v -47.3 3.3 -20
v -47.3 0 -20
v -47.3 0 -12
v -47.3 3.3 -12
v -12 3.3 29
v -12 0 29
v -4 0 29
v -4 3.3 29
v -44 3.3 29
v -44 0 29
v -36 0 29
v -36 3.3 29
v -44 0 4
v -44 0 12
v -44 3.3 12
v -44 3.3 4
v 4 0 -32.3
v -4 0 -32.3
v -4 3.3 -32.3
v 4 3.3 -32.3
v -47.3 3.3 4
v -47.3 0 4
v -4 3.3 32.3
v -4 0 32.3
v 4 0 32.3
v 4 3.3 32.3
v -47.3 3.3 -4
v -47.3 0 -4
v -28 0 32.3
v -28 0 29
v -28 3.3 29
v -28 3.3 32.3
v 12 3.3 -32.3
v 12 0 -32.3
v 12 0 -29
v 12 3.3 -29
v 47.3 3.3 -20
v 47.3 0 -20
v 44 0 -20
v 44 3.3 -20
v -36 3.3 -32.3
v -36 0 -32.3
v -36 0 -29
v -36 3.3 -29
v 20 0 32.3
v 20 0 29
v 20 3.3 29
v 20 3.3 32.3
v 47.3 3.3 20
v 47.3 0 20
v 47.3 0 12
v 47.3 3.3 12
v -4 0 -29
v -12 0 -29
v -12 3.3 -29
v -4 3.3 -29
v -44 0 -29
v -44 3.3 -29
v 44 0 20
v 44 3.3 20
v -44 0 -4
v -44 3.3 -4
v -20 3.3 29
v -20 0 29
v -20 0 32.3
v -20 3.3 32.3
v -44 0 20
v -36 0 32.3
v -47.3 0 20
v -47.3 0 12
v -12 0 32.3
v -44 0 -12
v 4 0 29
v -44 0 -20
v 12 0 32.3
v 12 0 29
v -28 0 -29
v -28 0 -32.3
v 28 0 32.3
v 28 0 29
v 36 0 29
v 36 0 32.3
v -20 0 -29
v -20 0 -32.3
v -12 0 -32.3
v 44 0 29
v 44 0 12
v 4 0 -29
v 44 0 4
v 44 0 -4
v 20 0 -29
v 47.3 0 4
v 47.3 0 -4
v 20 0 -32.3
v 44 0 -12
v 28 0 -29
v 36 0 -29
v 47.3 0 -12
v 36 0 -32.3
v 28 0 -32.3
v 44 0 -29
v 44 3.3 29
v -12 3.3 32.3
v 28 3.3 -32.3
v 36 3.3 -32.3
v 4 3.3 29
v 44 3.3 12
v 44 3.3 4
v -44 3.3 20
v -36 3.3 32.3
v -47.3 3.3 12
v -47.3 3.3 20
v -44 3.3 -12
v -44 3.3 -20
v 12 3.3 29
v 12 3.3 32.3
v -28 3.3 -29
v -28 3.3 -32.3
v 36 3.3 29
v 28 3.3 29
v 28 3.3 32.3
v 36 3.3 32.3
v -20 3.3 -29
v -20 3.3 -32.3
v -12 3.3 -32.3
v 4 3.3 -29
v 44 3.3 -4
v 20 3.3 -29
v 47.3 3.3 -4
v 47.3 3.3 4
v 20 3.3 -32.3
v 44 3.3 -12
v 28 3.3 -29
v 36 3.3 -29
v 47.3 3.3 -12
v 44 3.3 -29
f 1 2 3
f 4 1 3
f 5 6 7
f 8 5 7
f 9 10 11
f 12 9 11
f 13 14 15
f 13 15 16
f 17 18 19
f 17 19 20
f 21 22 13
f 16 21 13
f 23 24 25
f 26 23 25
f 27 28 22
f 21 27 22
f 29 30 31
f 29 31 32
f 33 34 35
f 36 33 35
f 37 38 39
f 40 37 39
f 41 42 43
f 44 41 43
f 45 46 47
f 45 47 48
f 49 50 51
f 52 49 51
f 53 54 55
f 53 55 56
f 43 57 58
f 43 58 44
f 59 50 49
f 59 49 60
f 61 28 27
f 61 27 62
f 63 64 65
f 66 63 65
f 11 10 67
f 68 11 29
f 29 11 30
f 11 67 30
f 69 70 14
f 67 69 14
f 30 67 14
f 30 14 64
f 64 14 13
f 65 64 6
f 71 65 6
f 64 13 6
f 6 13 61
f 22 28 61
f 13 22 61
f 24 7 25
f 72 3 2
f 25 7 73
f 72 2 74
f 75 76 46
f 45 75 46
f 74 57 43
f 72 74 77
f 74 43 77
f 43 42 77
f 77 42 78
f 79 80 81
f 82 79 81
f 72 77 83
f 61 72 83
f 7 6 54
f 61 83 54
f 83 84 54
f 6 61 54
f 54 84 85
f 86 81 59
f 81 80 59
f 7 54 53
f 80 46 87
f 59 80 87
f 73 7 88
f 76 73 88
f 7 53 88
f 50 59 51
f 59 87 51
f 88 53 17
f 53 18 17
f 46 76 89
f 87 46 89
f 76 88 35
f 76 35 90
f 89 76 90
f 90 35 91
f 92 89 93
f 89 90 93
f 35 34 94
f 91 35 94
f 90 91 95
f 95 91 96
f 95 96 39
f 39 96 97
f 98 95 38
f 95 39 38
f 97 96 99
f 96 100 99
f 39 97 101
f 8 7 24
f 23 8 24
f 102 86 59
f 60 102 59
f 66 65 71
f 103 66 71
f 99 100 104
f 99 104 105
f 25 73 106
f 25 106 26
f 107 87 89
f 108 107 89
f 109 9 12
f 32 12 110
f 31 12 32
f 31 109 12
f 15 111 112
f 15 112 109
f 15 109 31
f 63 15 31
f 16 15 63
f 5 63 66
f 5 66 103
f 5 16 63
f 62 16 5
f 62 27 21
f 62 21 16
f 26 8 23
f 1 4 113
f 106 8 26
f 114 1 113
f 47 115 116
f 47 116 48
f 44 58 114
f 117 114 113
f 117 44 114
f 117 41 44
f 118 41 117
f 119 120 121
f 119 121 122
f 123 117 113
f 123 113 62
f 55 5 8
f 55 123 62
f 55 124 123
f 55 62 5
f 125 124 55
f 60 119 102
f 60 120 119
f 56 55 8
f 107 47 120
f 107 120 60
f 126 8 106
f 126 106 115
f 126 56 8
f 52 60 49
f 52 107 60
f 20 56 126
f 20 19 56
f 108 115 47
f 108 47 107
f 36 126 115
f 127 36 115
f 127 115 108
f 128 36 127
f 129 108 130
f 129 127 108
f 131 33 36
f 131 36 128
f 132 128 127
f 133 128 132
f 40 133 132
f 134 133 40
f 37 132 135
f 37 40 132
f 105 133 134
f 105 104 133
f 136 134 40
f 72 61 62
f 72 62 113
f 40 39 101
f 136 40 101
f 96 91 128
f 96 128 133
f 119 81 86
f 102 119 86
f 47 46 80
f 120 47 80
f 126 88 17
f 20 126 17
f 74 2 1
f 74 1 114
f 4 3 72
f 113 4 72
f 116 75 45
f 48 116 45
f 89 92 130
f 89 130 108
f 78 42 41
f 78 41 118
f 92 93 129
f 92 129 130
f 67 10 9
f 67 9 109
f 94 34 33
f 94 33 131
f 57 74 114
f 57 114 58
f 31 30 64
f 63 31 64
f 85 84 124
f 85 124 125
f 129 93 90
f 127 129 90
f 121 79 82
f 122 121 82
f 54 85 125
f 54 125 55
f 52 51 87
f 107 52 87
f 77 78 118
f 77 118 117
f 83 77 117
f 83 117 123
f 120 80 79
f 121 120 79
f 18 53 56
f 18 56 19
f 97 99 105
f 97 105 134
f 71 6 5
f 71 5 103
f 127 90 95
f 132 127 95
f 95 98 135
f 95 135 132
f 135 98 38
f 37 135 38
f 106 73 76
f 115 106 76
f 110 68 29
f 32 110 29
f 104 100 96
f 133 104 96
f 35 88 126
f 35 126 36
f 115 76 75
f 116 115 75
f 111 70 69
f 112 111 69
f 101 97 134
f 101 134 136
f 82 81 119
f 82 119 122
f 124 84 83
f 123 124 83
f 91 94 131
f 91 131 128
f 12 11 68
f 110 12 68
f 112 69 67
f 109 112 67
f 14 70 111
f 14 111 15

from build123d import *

# Parameters (mm, degrees)
ESQUISSE4_W                    = 88
ESQUISSE4_H                    = 58
BOSS_EXTRU_3_DEPTH             = 3.3
ESQUISSE5_W                    = 8
ESQUISSE5_H                    = 3.3
BOSS_EXTRU_6_DEPTH             = 3.3
R_P_TITION_LIN_AIRE2_COUNT     = 3
R_P_TITION_LIN_AIRE2_PITCH     = 16
R_P_TITION_LIN_AIRE2_COL_COUNT = 3
R_P_TITION_LIN_AIRE2_COL_PITCH = 16
SYM_TRIE1_COPY_1_SKETCH_W      = 8
SYM_TRIE1_COPY_1_SKETCH_H      = 3.3
SYM_TRIE1_COPY_1_DEPTH         = 3.3
SYM_TRIE1_COPY_2_SKETCH_W      = 8
SYM_TRIE1_COPY_2_SKETCH_H      = 3.3
SYM_TRIE1_COPY_2_DEPTH         = 3.3
SYM_TRIE1_COPY_3_SKETCH_W      = 8
SYM_TRIE1_COPY_3_SKETCH_H      = 3.3
SYM_TRIE1_COPY_3_DEPTH         = 3.3
SYM_TRIE1_COPY_4_SKETCH_W      = 8
SYM_TRIE1_COPY_4_SKETCH_H      = 3.3
SYM_TRIE1_COPY_4_DEPTH         = 3.3
ESQUISSE6_W                    = 3.3
ESQUISSE6_H                    = 8
BOSS_EXTRU_7_DEPTH             = 3.3
R_P_TITION_LIN_AIRE3_COUNT     = 2
R_P_TITION_LIN_AIRE3_PITCH     = 16
R_P_TITION_LIN_AIRE3_COL_COUNT = 2
R_P_TITION_LIN_AIRE3_COL_PITCH = 16
SYM_TRIE2_COPY_1_SKETCH_W      = 3.3
SYM_TRIE2_COPY_1_SKETCH_H      = 8
SYM_TRIE2_COPY_1_DEPTH         = 3.3
SYM_TRIE2_COPY_2_SKETCH_W      = 3.3
SYM_TRIE2_COPY_2_SKETCH_H      = 8
SYM_TRIE2_COPY_2_DEPTH         = 3.3


with BuildPart() as part:
    # Esquisse4 → Boss.-Extru.3 (new body)
    with BuildSketch(Plane(origin=(0, 0, 0), x_dir=(1, 0, 0), z_dir=(0, 1, 0))):
        Rectangle(ESQUISSE4_W, ESQUISSE4_H)
    extrude(amount=BOSS_EXTRU_3_DEPTH)

    # Esquisse5 → Boss.-Extru.6 (add)
    with BuildSketch(Plane.XZ):
        with Locations((0, 30.65)):
            Rectangle(ESQUISSE5_W, ESQUISSE5_H)
    boss_extru_6 = extrude(amount=-BOSS_EXTRU_6_DEPTH)

    # Répétition linéaire2: Boss.-Extru.6 ×3
    with Locations(*[(-i * R_P_TITION_LIN_AIRE2_PITCH, 0, 0) for i in range(1, R_P_TITION_LIN_AIRE2_COUNT)]):
        add(boss_extru_6)

    # Répétition linéaire2 col: Boss.-Extru.6 ×3
    with Locations(*[(i * R_P_TITION_LIN_AIRE2_COL_PITCH, 0, 0) for i in range(1, R_P_TITION_LIN_AIRE2_COL_COUNT)]):
        add(boss_extru_6)

    # Symétrie1: Boss.-Extru.6 across plane
    add(boss_extru_6.mirror(Plane.XY))

    # Symétrie1 copy 1 sketch → Symétrie1 copy 1 (add)
    with BuildSketch(Plane(origin=(-16, 0, 0), x_dir=(1, 0, 0), z_dir=(0, -1, 0))):
        with Locations((0, -30.65)):
            Rectangle(SYM_TRIE1_COPY_1_SKETCH_W, SYM_TRIE1_COPY_1_SKETCH_H)
    extrude(amount=-SYM_TRIE1_COPY_1_DEPTH)

    # Symétrie1 copy 2 sketch → Symétrie1 copy 2 (add)
    with BuildSketch(Plane(origin=(-32, 0, 0), x_dir=(1, 0, 0), z_dir=(0, -1, 0))):
        with Locations((0, -30.65)):
            Rectangle(SYM_TRIE1_COPY_2_SKETCH_W, SYM_TRIE1_COPY_2_SKETCH_H)
    extrude(amount=-SYM_TRIE1_COPY_2_DEPTH)

    # Symétrie1 copy 3 sketch → Symétrie1 copy 3 (add)
    with BuildSketch(Plane(origin=(16, 0, 0), x_dir=(1, 0, 0), z_dir=(0, -1, 0))):
        with Locations((0, -30.65)):
            Rectangle(SYM_TRIE1_COPY_3_SKETCH_W, SYM_TRIE1_COPY_3_SKETCH_H)
    extrude(amount=-SYM_TRIE1_COPY_3_DEPTH)

    # Symétrie1 copy 4 sketch → Symétrie1 copy 4 (add)
    with BuildSketch(Plane(origin=(32, 0, 0), x_dir=(1, 0, 0), z_dir=(0, -1, 0))):
        with Locations((0, -30.65)):
            Rectangle(SYM_TRIE1_COPY_4_SKETCH_W, SYM_TRIE1_COPY_4_SKETCH_H)
    extrude(amount=-SYM_TRIE1_COPY_4_DEPTH)

    # Esquisse6 → Boss.-Extru.7 (add)
    with BuildSketch(Plane.XZ):
        with Locations((-45.65, 0)):
            Rectangle(ESQUISSE6_W, ESQUISSE6_H)
    boss_extru_7 = extrude(amount=-BOSS_EXTRU_7_DEPTH)

    # Répétition linéaire3: Boss.-Extru.7 ×2
    with Locations(*[(0, 0, i * R_P_TITION_LIN_AIRE3_PITCH) for i in range(1, R_P_TITION_LIN_AIRE3_COUNT)]):
        add(boss_extru_7)

    # Répétition linéaire3 col: Boss.-Extru.7 ×2
    with Locations(*[(0, 0, -i * R_P_TITION_LIN_AIRE3_COL_PITCH) for i in range(1, R_P_TITION_LIN_AIRE3_COL_COUNT)]):
        add(boss_extru_7)

    # Symétrie2: Boss.-Extru.7 across plane
    add(boss_extru_7.mirror(Plane(origin=(0, 0, 0), x_dir=(0, 0, 1), z_dir=(1, 0, 0))))

    # Symétrie2 copy 1 sketch → Symétrie2 copy 1 (add)
    with BuildSketch(Plane(origin=(0, 0, 16), x_dir=(-1, 0, 0), z_dir=(0, -1, 0))):
        with Locations((-45.65, 0)):
            Rectangle(SYM_TRIE2_COPY_1_SKETCH_W, SYM_TRIE2_COPY_1_SKETCH_H)
    extrude(amount=-SYM_TRIE2_COPY_1_DEPTH)

    # Symétrie2 copy 2 sketch → Symétrie2 copy 2 (add)
    with BuildSketch(Plane(origin=(0, 0, -16), x_dir=(-1, 0, 0), z_dir=(0, -1, 0))):
        with Locations((-45.65, 0)):
            Rectangle(SYM_TRIE2_COPY_2_SKETCH_W, SYM_TRIE2_COPY_2_SKETCH_H)
    extrude(amount=-SYM_TRIE2_COPY_2_DEPTH)


solid = part.part
